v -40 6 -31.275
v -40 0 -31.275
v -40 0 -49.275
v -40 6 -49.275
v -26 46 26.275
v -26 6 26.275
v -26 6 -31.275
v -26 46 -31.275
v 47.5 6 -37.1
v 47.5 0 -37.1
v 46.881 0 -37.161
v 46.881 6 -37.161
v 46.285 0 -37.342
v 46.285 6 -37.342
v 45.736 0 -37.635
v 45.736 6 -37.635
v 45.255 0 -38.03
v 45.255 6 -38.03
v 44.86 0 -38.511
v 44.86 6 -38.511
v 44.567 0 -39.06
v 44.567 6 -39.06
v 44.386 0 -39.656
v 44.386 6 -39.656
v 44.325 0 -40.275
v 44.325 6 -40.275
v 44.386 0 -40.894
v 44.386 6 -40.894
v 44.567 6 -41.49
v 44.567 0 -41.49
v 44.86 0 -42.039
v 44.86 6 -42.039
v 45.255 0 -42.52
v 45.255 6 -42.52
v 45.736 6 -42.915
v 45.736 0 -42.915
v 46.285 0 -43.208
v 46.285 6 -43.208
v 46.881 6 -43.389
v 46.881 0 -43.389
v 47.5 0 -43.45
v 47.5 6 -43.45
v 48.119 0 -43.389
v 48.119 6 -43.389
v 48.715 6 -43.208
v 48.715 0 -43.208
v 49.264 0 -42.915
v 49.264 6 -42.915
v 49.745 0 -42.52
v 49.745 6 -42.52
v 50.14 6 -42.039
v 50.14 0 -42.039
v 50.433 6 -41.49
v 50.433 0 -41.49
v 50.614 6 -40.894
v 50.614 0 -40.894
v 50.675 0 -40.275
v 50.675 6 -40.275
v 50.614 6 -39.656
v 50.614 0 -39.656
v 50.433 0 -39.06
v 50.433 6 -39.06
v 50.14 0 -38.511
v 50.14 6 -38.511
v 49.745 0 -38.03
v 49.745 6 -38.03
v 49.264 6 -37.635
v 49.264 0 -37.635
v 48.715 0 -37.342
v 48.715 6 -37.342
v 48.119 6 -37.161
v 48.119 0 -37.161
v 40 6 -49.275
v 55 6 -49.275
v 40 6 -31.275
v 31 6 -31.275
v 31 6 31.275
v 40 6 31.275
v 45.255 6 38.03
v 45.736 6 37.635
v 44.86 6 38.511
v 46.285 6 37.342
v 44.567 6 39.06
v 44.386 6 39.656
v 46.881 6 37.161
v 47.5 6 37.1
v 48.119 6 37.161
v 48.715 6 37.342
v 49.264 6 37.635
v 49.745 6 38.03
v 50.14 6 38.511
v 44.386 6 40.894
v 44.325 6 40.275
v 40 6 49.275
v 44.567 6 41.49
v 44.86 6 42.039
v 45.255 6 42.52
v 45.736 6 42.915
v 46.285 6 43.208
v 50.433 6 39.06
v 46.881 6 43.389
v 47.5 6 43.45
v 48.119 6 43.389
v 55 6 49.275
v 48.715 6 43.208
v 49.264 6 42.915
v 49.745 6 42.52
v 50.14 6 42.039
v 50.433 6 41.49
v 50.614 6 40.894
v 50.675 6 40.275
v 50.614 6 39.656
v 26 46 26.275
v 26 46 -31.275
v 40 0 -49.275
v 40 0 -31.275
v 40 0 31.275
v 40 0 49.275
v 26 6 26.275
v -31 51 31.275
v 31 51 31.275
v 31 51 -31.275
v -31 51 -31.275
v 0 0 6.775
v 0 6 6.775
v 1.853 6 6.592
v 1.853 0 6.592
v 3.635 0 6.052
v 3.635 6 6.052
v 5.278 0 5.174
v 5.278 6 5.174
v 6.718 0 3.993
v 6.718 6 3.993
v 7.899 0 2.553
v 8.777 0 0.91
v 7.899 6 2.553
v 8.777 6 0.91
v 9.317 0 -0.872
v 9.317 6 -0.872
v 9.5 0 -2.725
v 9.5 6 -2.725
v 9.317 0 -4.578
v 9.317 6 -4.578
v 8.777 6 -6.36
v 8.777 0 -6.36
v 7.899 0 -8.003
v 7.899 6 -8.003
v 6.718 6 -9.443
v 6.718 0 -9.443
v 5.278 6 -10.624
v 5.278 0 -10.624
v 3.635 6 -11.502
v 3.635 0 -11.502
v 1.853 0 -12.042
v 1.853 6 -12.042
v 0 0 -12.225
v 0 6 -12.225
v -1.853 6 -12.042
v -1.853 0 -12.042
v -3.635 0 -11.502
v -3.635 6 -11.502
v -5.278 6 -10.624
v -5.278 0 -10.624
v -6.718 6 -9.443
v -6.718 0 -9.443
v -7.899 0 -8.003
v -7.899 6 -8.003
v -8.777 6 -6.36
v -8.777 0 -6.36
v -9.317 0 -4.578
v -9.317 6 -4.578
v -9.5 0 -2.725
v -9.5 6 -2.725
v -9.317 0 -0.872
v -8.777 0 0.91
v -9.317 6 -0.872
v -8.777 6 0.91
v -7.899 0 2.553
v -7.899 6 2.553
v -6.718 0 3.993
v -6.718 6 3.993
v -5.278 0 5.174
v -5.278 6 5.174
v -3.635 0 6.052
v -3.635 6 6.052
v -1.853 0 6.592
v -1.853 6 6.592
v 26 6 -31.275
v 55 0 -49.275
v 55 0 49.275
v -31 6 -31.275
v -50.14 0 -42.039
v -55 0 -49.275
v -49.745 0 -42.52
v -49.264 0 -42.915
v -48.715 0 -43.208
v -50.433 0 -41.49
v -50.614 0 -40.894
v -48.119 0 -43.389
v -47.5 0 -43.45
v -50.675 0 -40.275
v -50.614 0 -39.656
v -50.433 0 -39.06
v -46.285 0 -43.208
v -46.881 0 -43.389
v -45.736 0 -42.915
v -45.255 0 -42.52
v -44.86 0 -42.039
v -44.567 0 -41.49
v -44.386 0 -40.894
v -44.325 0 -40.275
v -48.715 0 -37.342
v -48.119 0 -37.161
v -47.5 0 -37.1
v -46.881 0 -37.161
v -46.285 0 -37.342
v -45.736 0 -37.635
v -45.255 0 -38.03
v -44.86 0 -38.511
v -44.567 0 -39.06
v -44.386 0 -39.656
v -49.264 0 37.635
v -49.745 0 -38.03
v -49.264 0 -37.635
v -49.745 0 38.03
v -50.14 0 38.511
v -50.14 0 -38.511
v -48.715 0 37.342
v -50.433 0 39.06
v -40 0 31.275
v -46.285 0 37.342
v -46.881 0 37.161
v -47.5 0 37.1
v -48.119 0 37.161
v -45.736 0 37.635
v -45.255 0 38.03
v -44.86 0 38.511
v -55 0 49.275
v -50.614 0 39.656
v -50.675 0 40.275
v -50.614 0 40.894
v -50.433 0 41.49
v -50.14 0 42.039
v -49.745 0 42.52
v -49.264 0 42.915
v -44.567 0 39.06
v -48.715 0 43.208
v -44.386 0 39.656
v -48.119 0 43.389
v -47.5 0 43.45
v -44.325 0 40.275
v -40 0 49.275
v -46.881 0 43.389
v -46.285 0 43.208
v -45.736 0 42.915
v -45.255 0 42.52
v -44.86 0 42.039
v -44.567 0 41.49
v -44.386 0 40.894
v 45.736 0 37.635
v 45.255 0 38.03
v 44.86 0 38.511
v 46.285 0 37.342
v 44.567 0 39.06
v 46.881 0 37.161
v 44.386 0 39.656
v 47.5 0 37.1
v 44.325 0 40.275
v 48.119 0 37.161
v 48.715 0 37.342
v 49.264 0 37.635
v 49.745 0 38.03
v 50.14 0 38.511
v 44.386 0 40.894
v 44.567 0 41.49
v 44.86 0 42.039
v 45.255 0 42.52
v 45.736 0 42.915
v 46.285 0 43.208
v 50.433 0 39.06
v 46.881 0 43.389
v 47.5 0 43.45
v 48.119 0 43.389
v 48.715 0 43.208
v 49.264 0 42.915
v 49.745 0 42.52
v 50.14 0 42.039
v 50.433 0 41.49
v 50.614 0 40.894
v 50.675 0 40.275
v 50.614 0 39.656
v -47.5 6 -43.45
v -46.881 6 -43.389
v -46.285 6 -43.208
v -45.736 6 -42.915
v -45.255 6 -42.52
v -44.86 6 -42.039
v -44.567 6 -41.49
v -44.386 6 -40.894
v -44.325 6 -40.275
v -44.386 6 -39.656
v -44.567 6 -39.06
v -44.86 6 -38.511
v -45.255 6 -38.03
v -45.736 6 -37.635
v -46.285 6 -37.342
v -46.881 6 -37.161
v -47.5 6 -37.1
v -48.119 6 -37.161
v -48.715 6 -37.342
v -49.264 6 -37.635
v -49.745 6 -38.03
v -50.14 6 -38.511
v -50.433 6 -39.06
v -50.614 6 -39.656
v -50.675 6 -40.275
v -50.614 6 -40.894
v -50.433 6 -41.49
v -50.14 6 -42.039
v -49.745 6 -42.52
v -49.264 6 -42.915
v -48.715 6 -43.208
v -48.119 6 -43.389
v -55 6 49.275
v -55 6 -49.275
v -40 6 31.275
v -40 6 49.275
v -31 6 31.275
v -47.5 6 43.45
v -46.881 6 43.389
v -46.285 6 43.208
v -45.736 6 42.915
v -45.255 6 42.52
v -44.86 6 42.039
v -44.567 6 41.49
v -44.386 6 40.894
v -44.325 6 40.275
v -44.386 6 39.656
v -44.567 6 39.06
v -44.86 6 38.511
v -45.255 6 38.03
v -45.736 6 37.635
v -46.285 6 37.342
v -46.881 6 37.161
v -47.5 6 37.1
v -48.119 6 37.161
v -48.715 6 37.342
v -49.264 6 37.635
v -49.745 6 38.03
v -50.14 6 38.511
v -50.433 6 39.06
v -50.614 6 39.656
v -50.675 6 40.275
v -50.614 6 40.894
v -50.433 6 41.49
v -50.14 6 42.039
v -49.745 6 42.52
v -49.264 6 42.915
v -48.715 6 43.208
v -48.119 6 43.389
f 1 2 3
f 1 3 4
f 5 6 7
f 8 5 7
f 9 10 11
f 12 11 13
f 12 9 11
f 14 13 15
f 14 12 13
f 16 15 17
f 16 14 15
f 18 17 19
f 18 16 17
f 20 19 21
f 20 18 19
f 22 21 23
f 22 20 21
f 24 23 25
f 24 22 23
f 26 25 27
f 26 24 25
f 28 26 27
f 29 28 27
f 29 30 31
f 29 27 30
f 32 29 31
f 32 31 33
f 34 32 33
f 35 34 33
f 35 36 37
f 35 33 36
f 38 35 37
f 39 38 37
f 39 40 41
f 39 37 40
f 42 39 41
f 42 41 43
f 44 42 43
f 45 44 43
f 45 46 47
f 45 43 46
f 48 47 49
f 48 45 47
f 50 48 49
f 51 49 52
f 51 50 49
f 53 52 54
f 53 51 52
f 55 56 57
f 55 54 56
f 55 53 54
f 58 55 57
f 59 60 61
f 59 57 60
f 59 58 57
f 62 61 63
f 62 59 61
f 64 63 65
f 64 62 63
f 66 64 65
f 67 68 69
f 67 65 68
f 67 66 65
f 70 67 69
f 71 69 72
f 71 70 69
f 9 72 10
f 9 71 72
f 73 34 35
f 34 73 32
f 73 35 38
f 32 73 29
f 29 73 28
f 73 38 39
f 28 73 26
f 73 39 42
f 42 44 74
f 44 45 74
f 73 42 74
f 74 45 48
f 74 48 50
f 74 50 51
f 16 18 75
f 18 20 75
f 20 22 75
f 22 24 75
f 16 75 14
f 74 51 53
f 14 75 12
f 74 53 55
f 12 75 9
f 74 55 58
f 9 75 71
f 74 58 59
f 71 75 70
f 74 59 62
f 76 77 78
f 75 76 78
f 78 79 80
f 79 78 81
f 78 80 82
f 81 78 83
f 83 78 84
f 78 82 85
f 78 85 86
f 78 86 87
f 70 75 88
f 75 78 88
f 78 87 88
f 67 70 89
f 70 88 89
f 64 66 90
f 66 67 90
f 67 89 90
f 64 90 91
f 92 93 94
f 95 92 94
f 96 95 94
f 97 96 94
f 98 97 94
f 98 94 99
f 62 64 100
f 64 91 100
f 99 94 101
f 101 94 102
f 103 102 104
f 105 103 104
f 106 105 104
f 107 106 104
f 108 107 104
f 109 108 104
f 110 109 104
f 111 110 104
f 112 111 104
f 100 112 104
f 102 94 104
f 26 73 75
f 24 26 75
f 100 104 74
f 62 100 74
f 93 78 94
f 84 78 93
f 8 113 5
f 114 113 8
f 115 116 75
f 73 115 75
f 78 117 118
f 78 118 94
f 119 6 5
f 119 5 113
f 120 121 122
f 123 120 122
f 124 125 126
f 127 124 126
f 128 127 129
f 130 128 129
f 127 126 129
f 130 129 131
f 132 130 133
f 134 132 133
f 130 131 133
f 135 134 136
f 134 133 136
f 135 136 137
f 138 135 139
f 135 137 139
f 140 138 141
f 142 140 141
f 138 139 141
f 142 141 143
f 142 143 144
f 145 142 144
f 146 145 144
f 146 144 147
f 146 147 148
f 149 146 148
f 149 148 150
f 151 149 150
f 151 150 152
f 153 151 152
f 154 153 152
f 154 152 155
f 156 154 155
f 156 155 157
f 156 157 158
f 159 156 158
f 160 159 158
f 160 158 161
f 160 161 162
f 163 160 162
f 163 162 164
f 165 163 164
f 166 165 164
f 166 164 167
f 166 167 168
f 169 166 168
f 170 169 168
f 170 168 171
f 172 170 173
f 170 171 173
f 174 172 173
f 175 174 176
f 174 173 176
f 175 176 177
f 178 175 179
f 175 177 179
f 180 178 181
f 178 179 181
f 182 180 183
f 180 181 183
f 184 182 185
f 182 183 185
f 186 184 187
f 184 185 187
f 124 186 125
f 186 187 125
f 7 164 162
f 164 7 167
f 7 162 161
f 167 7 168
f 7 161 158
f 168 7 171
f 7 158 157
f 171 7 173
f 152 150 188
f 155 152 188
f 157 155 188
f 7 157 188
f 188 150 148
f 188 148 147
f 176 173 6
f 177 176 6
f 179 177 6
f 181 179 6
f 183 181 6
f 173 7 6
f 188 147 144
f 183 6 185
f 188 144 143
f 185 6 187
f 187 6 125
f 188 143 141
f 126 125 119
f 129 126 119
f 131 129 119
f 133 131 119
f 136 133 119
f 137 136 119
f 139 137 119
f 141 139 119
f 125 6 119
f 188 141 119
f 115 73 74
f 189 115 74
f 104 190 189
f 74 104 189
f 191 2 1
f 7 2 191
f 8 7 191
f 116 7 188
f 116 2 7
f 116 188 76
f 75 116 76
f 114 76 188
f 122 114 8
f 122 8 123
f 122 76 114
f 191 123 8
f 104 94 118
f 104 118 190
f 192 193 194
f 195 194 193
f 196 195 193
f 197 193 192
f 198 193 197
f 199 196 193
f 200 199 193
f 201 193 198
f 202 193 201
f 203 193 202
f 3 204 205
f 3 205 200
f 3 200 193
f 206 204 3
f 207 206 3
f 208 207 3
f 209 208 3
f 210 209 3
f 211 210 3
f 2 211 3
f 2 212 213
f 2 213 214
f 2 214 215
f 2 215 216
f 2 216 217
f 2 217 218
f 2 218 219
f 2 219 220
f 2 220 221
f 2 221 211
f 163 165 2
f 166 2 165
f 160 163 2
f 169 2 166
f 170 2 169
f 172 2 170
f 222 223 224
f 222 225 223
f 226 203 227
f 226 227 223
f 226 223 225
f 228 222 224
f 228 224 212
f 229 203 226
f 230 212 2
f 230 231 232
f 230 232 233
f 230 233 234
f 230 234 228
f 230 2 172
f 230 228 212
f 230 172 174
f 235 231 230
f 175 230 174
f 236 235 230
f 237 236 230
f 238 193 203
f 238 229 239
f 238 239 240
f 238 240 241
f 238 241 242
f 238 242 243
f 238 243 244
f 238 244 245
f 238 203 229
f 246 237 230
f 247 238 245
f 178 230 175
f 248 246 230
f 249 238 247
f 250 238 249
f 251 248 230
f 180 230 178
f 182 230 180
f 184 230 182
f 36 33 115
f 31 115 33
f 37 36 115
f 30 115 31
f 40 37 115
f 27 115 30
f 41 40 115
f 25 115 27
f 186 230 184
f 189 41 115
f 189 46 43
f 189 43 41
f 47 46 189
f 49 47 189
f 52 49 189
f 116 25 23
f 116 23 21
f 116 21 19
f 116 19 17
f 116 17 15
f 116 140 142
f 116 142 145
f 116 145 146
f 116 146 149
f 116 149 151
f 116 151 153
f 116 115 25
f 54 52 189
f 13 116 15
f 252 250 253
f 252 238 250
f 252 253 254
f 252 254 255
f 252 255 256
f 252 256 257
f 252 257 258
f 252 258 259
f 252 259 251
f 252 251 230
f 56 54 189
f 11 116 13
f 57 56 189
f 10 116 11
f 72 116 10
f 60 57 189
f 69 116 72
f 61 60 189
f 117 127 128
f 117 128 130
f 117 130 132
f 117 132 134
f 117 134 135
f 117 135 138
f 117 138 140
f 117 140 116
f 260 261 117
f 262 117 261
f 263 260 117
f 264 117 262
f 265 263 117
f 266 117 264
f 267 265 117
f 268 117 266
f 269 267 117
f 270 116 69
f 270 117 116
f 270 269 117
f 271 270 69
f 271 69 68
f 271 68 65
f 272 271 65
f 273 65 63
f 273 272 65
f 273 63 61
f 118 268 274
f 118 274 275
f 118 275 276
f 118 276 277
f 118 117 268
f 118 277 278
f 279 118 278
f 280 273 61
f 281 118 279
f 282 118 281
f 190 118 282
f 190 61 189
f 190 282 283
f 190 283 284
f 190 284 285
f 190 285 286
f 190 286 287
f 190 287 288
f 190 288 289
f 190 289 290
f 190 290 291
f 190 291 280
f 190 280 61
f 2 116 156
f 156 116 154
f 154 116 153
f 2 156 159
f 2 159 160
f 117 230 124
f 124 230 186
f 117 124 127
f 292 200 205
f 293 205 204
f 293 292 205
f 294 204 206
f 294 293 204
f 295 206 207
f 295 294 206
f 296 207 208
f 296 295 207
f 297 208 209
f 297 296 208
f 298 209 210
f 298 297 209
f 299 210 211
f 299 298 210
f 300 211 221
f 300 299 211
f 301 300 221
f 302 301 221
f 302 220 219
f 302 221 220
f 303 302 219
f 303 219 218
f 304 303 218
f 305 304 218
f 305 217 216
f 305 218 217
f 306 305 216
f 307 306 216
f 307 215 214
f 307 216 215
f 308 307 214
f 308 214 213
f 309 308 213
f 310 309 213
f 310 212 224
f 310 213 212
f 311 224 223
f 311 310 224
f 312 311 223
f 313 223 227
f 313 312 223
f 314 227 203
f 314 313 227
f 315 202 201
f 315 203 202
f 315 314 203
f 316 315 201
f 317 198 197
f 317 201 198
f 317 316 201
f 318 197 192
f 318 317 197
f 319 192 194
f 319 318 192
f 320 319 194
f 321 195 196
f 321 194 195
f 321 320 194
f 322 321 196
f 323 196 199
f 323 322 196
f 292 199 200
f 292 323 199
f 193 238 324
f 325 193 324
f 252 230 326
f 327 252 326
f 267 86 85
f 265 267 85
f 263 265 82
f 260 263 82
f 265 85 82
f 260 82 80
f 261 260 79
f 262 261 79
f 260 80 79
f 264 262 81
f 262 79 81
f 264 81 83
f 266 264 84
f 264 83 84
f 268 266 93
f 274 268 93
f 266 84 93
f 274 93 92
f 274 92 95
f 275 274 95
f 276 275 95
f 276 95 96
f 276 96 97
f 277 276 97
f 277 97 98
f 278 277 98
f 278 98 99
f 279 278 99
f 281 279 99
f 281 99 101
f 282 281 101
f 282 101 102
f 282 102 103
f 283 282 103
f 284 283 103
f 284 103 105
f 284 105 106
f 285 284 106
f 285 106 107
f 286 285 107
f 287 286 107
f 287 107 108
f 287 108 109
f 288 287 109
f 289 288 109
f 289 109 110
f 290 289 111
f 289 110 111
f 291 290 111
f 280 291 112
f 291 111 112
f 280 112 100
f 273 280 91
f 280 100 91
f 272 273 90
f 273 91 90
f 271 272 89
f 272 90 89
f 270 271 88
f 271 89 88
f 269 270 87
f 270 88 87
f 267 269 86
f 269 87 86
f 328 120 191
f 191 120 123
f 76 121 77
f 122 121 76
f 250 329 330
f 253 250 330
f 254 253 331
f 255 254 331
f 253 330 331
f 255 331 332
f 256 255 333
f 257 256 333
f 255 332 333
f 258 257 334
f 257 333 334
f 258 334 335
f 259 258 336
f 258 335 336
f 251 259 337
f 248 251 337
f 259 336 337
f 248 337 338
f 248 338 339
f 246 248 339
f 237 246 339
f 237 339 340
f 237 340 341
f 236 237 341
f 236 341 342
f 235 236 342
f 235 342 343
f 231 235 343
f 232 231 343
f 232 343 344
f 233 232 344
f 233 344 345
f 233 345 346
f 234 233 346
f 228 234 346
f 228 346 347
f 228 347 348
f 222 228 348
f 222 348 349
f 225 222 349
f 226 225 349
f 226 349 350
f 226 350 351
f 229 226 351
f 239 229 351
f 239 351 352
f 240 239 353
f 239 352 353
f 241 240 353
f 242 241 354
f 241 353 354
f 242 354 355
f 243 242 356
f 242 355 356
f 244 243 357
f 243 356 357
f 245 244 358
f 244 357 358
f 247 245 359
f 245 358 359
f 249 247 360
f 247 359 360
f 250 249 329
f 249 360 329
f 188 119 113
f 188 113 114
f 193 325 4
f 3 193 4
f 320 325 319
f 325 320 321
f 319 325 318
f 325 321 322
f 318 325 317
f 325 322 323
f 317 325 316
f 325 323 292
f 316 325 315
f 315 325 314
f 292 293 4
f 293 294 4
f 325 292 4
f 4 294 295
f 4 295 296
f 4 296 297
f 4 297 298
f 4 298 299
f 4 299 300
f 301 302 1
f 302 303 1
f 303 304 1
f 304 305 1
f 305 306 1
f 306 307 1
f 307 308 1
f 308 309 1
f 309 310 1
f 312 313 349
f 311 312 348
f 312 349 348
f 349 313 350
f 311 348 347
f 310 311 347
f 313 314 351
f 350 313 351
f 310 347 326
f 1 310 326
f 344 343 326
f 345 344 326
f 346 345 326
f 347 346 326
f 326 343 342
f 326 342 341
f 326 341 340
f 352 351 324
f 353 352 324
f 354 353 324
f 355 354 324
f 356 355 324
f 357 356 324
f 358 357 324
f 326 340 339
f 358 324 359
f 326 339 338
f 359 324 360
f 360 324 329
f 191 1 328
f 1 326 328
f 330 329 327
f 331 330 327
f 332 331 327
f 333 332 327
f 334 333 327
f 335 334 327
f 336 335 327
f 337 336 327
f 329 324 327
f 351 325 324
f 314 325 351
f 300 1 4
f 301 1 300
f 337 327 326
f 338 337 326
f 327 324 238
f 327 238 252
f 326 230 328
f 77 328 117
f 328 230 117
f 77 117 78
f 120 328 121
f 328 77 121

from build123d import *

# Parameters (mm, degrees)
SKETCH1_W           = 110
SKETCH1_H           = 62.55
BOSS_EXTRUDE1_DEPTH = 6
CUT_EXTRUDE1_REACH  = 65.554
SKETCH2_R           = 9.5
SKETCH4_W           = 15
SKETCH4_H           = 6
BOSS_EXTRUDE2_DEPTH = 18
SKETCH5_R           = 3.175
CUT_EXTRUDE3_DEPTH  = 18
SKETCH6_W           = 5
SKETCH6_H           = 62.55
BOSS_EXTRUDE3_DEPTH = 40
SKETCH7_W           = 62.55
SKETCH7_H           = 5
BOSS_EXTRUDE4_DEPTH = 62
BOSS_EXTRUDE5_REACH = 88.476
SKETCH8_W           = 52
SKETCH8_H           = 5


with BuildPart() as part:
    # Sketch1 → Boss-Extrude1 (new body)
    with BuildSketch(Plane(origin=(0, 0, 0), x_dir=(1, 0, 0), z_dir=(0, 1, 0))):
        Rectangle(SKETCH1_W, SKETCH1_H)
    extrude(amount=BOSS_EXTRUDE1_DEPTH)

    # Sketch2 → Cut-Extrude1 (cut, up to next)
    with BuildSketch(Plane(origin=(0, 6, 0), x_dir=(1, 0, 0), z_dir=(0, 1, 0)), mode=Mode.PRIVATE) as cut_extrude1_sk1:
        with Locations(Location((0, 2.725, 0), (0, 0, 270))):
            Circle(SKETCH2_R)
    cut_extrude1_tool1 = extrude(cut_extrude1_sk1.sketch, amount=-CUT_EXTRUDE1_REACH, mode=Mode.PRIVATE) & part.part
    add(cut_extrude1_tool1.solids().sort_by_distance((0, 6, -2.725))[0], mode=Mode.SUBTRACT)

    # Sketch4 → Boss-Extrude2 (add)
    with BuildSketch(Plane.XY.offset(31.275)):
        with Locations((-47.5, 3)):
            Rectangle(SKETCH4_W, SKETCH4_H)
        with Locations((47.5, 3)):
            Rectangle(SKETCH4_W, SKETCH4_H)
    boss_extrude2 = extrude(amount=BOSS_EXTRUDE2_DEPTH)

    # Sketch5 → Cut-Extrude3 (cut)
    with BuildSketch(Plane(origin=(0, 6, 0), x_dir=(1, 0, 0), z_dir=(0, 1, 0))):
        with Locations(Location((-47.5, -40.275, 0), (0, 0, 270))):
            Circle(SKETCH5_R)
        with Locations(Location((47.5, -40.275, 0), (0, 0, 90))):
            Circle(SKETCH5_R)
    cut_extrude3 = extrude(amount=-CUT_EXTRUDE3_DEPTH, mode=Mode.SUBTRACT)

    # Mirror1: Boss-Extrude2, Cut-Extrude3 across plane
    add(boss_extrude2.mirror(Plane.XY))
    add(cut_extrude3.mirror(Plane.XY), mode=Mode.SUBTRACT)

    # Sketch6 → Boss-Extrude3 (add)
    with BuildSketch(Plane(origin=(0, 6, 0), x_dir=(1, 0, 0), z_dir=(0, 1, 0))):
        with Locations((28.5, 0)):
            Rectangle(SKETCH6_W, SKETCH6_H)
        with Locations((-28.5, 0)):
            Rectangle(SKETCH6_W, SKETCH6_H)
    extrude(amount=BOSS_EXTRUDE3_DEPTH)

    # Sketch7 → Boss-Extrude4 (add)
    with BuildSketch(Plane(origin=(31, 0, 0), x_dir=(0, 0, -1), z_dir=(1, 0, 0))):
        with Locations((0, 48.5)):
            Rectangle(SKETCH7_W, SKETCH7_H)
    extrude(amount=-BOSS_EXTRUDE4_DEPTH)

    # Sketch8 → Boss-Extrude5 (add, up to next)
    with BuildSketch(Plane(origin=(0, 6, 0), x_dir=(1, 0, 0), z_dir=(0, 1, 0)), mode=Mode.PRIVATE) as boss_extrude5_sk1:
        with Locations((0, -28.775)):
            Rectangle(SKETCH8_W, SKETCH8_H)
    boss_extrude5_tool1 = extrude(boss_extrude5_sk1.sketch, amount=BOSS_EXTRUDE5_REACH, mode=Mode.PRIVATE) - part.part
    add(boss_extrude5_tool1.solids().sort_by_distance((0, 6, 28.775))[0])


solid = part.part
